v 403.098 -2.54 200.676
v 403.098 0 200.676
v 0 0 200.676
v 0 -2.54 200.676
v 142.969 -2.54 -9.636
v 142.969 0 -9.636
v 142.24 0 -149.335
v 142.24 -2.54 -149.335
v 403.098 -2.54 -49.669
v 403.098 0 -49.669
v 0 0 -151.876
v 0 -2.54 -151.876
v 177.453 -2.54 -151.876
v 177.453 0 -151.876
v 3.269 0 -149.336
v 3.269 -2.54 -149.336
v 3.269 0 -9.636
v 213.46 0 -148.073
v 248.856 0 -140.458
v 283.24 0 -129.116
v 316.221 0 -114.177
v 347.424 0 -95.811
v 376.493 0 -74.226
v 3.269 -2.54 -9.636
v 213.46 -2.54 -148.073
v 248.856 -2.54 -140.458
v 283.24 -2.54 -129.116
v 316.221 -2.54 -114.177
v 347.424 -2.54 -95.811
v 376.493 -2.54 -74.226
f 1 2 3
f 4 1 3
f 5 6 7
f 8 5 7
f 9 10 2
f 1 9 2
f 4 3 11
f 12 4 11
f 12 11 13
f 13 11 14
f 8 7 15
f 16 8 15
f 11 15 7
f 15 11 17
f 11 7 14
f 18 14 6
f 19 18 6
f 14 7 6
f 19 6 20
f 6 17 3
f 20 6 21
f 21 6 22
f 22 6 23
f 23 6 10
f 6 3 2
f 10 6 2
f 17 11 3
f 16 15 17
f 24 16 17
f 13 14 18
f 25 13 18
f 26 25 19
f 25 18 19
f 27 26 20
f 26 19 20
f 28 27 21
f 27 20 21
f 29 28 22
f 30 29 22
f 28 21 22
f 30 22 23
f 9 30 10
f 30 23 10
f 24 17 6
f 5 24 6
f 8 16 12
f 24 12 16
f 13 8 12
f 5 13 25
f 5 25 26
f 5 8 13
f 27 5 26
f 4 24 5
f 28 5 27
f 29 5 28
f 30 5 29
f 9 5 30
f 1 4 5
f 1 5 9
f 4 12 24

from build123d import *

# Parameters (mm, degrees)
F1_DEPTH = 2.54


with BuildPart() as f1:
    # F0 (on Front) → F1 (new body)
    with BuildSketch(Plane.XZ):
        with BuildLine():
            Line((403.098, 200.675558), (0, 200.675558))
            Line((0, 200.675558), (0, -151.876442))
            Line((0, -151.876442), (142.24, -151.876442))
            Line((142.24, -151.876442), (177.453318, -151.876442))
            ThreePointArc((177.453318, -151.876442), (299.929986, -122.086368), (403.098, -49.668528))
            Line((403.098, -49.668528), (403.098, -45.196442))
            Line((403.098, -45.196442), (403.098, 200.675558))
        make_face()
        Polygon((142.969289, -9.636442), (142.24, -149.334539), (3.269289, -149.336442), (3.269289, -9.636442), align=None, mode=Mode.SUBTRACT)
    extrude(amount=F1_DEPTH)


solid = f1.part
